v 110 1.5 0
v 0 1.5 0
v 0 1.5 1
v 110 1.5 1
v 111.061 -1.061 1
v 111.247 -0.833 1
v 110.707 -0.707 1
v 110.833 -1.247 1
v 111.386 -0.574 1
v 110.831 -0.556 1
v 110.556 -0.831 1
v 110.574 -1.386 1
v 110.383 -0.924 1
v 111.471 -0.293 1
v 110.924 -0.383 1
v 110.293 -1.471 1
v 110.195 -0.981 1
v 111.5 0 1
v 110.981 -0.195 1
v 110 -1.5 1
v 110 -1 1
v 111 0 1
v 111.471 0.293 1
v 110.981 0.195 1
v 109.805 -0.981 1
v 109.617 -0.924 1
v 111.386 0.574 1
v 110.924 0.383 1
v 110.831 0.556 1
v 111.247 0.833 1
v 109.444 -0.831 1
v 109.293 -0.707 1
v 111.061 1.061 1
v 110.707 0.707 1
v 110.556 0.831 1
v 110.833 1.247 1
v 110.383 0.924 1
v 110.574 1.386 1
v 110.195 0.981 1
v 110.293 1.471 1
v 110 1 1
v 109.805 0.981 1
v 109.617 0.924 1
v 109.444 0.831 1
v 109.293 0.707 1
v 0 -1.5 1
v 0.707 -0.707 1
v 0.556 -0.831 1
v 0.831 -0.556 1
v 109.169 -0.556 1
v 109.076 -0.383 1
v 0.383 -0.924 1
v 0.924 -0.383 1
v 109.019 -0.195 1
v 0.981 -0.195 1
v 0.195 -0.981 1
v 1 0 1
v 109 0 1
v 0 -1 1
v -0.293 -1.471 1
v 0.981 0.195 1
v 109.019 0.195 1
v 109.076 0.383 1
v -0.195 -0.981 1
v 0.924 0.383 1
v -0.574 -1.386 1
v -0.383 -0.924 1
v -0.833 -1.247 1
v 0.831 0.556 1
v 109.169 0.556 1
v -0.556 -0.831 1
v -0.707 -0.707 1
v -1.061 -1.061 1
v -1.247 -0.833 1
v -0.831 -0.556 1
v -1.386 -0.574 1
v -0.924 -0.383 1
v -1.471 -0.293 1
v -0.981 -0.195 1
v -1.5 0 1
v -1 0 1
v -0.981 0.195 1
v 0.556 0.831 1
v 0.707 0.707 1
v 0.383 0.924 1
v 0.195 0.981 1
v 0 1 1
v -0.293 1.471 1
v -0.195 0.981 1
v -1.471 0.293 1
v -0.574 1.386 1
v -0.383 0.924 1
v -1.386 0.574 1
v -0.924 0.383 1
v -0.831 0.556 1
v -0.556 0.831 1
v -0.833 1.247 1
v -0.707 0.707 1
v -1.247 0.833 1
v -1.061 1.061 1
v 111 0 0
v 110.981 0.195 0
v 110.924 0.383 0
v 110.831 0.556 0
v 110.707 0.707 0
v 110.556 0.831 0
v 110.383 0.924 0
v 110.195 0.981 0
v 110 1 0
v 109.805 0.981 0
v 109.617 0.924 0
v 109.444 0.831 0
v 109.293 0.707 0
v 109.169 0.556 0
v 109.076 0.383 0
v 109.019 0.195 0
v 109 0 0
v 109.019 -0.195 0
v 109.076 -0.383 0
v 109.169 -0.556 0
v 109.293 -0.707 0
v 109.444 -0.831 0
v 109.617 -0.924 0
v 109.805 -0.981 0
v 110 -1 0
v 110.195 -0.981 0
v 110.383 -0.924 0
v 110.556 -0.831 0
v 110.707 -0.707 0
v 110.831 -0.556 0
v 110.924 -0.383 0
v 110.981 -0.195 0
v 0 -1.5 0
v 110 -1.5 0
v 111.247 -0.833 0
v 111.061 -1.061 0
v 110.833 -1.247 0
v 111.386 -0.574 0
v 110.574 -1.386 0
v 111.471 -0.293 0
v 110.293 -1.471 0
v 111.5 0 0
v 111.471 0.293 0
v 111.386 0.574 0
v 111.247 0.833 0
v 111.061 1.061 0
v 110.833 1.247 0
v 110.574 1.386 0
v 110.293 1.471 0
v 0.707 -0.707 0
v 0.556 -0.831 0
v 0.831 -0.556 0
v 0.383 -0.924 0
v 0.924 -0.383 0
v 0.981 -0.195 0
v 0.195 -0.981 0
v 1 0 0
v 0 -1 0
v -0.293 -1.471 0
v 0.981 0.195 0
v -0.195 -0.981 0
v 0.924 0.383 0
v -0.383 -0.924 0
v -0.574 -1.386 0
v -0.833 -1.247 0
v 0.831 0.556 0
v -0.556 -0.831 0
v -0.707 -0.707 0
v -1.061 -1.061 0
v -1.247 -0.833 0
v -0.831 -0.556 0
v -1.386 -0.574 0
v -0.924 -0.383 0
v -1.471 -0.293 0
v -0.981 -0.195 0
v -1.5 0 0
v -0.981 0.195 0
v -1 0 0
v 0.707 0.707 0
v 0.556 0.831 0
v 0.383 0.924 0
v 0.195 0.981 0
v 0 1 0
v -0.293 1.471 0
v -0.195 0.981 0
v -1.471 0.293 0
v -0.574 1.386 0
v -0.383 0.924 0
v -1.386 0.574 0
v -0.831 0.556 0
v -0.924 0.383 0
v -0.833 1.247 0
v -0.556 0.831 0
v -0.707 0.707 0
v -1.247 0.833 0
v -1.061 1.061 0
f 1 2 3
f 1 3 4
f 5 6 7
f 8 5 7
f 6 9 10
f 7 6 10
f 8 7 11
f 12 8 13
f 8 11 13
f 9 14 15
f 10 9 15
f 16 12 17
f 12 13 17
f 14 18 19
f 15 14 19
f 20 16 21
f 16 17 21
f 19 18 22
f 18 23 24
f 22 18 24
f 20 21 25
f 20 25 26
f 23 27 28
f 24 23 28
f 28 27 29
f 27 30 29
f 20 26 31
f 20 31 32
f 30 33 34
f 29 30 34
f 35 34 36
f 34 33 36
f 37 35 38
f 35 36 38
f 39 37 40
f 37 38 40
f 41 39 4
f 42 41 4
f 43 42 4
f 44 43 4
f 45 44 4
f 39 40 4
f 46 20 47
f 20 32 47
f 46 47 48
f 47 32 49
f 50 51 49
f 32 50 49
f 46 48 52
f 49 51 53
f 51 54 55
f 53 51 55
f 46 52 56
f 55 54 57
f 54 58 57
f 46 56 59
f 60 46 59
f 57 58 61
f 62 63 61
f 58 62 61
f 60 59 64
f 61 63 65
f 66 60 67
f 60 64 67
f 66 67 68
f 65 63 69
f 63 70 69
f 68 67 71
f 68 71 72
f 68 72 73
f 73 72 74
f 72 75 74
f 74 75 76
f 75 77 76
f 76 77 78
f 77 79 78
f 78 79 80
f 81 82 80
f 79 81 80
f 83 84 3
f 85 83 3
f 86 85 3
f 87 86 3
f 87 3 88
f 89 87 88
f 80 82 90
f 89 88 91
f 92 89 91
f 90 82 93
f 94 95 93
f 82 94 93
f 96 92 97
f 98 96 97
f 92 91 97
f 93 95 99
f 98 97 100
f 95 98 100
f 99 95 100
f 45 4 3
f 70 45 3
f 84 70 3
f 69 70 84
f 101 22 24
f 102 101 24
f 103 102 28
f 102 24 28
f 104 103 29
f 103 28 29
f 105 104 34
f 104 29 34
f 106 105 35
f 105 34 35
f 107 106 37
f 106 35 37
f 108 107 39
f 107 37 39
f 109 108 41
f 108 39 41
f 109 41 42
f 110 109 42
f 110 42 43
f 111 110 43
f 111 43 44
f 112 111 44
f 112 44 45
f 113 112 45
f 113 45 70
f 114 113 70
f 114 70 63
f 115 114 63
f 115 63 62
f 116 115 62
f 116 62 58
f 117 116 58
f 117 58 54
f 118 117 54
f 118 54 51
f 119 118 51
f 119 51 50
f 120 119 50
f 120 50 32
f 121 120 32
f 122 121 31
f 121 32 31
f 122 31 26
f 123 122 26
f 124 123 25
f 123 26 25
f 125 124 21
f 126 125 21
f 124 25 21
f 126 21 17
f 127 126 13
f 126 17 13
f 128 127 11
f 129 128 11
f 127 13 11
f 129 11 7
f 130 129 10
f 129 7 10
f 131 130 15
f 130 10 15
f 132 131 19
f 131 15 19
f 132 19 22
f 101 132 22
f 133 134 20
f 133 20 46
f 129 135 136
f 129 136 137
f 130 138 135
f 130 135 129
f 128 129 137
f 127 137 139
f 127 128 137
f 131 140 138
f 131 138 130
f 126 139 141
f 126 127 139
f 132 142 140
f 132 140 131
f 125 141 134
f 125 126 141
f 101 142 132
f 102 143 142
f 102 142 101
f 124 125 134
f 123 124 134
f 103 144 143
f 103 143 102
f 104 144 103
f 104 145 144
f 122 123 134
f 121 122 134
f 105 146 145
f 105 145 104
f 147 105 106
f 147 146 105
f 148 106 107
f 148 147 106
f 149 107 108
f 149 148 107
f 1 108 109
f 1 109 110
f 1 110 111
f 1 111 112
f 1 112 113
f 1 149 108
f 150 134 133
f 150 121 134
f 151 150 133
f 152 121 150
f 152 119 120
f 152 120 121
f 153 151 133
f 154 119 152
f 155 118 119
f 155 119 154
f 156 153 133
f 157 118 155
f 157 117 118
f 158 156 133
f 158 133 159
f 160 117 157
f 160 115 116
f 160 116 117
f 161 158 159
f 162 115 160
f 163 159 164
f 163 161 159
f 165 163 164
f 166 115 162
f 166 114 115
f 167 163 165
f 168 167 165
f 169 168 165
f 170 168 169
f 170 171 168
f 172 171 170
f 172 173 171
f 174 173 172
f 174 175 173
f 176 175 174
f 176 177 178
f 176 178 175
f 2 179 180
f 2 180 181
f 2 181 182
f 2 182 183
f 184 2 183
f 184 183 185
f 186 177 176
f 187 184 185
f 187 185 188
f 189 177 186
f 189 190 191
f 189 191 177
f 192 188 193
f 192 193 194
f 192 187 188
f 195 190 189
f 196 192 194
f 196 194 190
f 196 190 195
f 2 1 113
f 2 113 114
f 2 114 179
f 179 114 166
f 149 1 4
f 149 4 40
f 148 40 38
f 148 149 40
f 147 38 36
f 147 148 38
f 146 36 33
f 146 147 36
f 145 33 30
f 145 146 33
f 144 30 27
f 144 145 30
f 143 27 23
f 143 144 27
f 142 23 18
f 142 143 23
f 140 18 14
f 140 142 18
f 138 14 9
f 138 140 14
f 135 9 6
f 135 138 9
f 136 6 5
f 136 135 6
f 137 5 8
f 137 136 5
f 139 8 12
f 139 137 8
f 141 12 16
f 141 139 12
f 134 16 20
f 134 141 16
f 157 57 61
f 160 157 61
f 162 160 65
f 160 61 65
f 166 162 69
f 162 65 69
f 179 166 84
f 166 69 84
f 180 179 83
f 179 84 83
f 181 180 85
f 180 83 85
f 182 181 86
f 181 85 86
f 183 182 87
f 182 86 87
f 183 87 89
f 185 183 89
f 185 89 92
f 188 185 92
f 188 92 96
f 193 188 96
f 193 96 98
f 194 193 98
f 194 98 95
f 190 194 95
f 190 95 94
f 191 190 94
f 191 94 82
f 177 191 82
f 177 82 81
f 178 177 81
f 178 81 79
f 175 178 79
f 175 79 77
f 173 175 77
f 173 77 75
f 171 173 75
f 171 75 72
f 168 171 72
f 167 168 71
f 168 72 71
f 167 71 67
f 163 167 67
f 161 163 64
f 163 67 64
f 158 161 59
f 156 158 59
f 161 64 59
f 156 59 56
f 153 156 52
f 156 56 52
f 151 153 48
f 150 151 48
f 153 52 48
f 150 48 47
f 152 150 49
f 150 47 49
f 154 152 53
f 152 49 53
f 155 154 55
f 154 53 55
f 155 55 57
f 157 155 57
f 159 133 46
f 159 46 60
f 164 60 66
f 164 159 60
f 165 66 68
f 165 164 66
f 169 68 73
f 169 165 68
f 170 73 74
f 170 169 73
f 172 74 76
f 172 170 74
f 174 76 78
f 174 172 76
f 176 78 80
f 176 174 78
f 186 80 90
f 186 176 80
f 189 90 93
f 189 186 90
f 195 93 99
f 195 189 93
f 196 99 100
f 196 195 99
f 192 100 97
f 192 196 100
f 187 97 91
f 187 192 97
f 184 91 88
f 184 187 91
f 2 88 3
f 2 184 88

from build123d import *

# Parameters (mm, degrees)
BOSS_EXTRUDE1_DEPTH = 1
CUT_EXTRUDE2_REACH  = 113.515
SKETCH2_R           = 1


with BuildPart() as part:
    # Sketch1 → Boss-Extrude1 (new body)
    with BuildSketch(Plane.XY):
        with BuildLine():
            Line((0, 1.5), (110, 1.5))
            ThreePointArc((110, 1.5), (111.5, 0), (110, -1.5))
            Line((110, -1.5), (0, -1.5))
            ThreePointArc((0, -1.5), (-1.5, 0), (0, 1.5))
        make_face()
    extrude(amount=BOSS_EXTRUDE1_DEPTH)

    # Sketch2 → Cut-Extrude2 (cut, up to next)
    with BuildSketch(Plane.XY.offset(1), mode=Mode.PRIVATE) as cut_extrude2_sk1:
        Circle(SKETCH2_R)
    cut_extrude2_tool1 = extrude(cut_extrude2_sk1.sketch, amount=-CUT_EXTRUDE2_REACH, mode=Mode.PRIVATE) & part.part
    # Sketch2 → Cut-Extrude2 (cut, up to next)
    with BuildSketch(Plane.XY.offset(1), mode=Mode.PRIVATE) as cut_extrude2_sk2:
        with Locations((110, 0)):
            Circle(SKETCH2_R)
    cut_extrude2_tool2 = extrude(cut_extrude2_sk2.sketch, amount=-CUT_EXTRUDE2_REACH, mode=Mode.PRIVATE) & part.part
    add(cut_extrude2_tool1.solids().sort_by_distance((0, 0, 1))[0], mode=Mode.SUBTRACT)
    add(cut_extrude2_tool2.solids().sort_by_distance((110, 0, 1))[0], mode=Mode.SUBTRACT)


solid = part.part
